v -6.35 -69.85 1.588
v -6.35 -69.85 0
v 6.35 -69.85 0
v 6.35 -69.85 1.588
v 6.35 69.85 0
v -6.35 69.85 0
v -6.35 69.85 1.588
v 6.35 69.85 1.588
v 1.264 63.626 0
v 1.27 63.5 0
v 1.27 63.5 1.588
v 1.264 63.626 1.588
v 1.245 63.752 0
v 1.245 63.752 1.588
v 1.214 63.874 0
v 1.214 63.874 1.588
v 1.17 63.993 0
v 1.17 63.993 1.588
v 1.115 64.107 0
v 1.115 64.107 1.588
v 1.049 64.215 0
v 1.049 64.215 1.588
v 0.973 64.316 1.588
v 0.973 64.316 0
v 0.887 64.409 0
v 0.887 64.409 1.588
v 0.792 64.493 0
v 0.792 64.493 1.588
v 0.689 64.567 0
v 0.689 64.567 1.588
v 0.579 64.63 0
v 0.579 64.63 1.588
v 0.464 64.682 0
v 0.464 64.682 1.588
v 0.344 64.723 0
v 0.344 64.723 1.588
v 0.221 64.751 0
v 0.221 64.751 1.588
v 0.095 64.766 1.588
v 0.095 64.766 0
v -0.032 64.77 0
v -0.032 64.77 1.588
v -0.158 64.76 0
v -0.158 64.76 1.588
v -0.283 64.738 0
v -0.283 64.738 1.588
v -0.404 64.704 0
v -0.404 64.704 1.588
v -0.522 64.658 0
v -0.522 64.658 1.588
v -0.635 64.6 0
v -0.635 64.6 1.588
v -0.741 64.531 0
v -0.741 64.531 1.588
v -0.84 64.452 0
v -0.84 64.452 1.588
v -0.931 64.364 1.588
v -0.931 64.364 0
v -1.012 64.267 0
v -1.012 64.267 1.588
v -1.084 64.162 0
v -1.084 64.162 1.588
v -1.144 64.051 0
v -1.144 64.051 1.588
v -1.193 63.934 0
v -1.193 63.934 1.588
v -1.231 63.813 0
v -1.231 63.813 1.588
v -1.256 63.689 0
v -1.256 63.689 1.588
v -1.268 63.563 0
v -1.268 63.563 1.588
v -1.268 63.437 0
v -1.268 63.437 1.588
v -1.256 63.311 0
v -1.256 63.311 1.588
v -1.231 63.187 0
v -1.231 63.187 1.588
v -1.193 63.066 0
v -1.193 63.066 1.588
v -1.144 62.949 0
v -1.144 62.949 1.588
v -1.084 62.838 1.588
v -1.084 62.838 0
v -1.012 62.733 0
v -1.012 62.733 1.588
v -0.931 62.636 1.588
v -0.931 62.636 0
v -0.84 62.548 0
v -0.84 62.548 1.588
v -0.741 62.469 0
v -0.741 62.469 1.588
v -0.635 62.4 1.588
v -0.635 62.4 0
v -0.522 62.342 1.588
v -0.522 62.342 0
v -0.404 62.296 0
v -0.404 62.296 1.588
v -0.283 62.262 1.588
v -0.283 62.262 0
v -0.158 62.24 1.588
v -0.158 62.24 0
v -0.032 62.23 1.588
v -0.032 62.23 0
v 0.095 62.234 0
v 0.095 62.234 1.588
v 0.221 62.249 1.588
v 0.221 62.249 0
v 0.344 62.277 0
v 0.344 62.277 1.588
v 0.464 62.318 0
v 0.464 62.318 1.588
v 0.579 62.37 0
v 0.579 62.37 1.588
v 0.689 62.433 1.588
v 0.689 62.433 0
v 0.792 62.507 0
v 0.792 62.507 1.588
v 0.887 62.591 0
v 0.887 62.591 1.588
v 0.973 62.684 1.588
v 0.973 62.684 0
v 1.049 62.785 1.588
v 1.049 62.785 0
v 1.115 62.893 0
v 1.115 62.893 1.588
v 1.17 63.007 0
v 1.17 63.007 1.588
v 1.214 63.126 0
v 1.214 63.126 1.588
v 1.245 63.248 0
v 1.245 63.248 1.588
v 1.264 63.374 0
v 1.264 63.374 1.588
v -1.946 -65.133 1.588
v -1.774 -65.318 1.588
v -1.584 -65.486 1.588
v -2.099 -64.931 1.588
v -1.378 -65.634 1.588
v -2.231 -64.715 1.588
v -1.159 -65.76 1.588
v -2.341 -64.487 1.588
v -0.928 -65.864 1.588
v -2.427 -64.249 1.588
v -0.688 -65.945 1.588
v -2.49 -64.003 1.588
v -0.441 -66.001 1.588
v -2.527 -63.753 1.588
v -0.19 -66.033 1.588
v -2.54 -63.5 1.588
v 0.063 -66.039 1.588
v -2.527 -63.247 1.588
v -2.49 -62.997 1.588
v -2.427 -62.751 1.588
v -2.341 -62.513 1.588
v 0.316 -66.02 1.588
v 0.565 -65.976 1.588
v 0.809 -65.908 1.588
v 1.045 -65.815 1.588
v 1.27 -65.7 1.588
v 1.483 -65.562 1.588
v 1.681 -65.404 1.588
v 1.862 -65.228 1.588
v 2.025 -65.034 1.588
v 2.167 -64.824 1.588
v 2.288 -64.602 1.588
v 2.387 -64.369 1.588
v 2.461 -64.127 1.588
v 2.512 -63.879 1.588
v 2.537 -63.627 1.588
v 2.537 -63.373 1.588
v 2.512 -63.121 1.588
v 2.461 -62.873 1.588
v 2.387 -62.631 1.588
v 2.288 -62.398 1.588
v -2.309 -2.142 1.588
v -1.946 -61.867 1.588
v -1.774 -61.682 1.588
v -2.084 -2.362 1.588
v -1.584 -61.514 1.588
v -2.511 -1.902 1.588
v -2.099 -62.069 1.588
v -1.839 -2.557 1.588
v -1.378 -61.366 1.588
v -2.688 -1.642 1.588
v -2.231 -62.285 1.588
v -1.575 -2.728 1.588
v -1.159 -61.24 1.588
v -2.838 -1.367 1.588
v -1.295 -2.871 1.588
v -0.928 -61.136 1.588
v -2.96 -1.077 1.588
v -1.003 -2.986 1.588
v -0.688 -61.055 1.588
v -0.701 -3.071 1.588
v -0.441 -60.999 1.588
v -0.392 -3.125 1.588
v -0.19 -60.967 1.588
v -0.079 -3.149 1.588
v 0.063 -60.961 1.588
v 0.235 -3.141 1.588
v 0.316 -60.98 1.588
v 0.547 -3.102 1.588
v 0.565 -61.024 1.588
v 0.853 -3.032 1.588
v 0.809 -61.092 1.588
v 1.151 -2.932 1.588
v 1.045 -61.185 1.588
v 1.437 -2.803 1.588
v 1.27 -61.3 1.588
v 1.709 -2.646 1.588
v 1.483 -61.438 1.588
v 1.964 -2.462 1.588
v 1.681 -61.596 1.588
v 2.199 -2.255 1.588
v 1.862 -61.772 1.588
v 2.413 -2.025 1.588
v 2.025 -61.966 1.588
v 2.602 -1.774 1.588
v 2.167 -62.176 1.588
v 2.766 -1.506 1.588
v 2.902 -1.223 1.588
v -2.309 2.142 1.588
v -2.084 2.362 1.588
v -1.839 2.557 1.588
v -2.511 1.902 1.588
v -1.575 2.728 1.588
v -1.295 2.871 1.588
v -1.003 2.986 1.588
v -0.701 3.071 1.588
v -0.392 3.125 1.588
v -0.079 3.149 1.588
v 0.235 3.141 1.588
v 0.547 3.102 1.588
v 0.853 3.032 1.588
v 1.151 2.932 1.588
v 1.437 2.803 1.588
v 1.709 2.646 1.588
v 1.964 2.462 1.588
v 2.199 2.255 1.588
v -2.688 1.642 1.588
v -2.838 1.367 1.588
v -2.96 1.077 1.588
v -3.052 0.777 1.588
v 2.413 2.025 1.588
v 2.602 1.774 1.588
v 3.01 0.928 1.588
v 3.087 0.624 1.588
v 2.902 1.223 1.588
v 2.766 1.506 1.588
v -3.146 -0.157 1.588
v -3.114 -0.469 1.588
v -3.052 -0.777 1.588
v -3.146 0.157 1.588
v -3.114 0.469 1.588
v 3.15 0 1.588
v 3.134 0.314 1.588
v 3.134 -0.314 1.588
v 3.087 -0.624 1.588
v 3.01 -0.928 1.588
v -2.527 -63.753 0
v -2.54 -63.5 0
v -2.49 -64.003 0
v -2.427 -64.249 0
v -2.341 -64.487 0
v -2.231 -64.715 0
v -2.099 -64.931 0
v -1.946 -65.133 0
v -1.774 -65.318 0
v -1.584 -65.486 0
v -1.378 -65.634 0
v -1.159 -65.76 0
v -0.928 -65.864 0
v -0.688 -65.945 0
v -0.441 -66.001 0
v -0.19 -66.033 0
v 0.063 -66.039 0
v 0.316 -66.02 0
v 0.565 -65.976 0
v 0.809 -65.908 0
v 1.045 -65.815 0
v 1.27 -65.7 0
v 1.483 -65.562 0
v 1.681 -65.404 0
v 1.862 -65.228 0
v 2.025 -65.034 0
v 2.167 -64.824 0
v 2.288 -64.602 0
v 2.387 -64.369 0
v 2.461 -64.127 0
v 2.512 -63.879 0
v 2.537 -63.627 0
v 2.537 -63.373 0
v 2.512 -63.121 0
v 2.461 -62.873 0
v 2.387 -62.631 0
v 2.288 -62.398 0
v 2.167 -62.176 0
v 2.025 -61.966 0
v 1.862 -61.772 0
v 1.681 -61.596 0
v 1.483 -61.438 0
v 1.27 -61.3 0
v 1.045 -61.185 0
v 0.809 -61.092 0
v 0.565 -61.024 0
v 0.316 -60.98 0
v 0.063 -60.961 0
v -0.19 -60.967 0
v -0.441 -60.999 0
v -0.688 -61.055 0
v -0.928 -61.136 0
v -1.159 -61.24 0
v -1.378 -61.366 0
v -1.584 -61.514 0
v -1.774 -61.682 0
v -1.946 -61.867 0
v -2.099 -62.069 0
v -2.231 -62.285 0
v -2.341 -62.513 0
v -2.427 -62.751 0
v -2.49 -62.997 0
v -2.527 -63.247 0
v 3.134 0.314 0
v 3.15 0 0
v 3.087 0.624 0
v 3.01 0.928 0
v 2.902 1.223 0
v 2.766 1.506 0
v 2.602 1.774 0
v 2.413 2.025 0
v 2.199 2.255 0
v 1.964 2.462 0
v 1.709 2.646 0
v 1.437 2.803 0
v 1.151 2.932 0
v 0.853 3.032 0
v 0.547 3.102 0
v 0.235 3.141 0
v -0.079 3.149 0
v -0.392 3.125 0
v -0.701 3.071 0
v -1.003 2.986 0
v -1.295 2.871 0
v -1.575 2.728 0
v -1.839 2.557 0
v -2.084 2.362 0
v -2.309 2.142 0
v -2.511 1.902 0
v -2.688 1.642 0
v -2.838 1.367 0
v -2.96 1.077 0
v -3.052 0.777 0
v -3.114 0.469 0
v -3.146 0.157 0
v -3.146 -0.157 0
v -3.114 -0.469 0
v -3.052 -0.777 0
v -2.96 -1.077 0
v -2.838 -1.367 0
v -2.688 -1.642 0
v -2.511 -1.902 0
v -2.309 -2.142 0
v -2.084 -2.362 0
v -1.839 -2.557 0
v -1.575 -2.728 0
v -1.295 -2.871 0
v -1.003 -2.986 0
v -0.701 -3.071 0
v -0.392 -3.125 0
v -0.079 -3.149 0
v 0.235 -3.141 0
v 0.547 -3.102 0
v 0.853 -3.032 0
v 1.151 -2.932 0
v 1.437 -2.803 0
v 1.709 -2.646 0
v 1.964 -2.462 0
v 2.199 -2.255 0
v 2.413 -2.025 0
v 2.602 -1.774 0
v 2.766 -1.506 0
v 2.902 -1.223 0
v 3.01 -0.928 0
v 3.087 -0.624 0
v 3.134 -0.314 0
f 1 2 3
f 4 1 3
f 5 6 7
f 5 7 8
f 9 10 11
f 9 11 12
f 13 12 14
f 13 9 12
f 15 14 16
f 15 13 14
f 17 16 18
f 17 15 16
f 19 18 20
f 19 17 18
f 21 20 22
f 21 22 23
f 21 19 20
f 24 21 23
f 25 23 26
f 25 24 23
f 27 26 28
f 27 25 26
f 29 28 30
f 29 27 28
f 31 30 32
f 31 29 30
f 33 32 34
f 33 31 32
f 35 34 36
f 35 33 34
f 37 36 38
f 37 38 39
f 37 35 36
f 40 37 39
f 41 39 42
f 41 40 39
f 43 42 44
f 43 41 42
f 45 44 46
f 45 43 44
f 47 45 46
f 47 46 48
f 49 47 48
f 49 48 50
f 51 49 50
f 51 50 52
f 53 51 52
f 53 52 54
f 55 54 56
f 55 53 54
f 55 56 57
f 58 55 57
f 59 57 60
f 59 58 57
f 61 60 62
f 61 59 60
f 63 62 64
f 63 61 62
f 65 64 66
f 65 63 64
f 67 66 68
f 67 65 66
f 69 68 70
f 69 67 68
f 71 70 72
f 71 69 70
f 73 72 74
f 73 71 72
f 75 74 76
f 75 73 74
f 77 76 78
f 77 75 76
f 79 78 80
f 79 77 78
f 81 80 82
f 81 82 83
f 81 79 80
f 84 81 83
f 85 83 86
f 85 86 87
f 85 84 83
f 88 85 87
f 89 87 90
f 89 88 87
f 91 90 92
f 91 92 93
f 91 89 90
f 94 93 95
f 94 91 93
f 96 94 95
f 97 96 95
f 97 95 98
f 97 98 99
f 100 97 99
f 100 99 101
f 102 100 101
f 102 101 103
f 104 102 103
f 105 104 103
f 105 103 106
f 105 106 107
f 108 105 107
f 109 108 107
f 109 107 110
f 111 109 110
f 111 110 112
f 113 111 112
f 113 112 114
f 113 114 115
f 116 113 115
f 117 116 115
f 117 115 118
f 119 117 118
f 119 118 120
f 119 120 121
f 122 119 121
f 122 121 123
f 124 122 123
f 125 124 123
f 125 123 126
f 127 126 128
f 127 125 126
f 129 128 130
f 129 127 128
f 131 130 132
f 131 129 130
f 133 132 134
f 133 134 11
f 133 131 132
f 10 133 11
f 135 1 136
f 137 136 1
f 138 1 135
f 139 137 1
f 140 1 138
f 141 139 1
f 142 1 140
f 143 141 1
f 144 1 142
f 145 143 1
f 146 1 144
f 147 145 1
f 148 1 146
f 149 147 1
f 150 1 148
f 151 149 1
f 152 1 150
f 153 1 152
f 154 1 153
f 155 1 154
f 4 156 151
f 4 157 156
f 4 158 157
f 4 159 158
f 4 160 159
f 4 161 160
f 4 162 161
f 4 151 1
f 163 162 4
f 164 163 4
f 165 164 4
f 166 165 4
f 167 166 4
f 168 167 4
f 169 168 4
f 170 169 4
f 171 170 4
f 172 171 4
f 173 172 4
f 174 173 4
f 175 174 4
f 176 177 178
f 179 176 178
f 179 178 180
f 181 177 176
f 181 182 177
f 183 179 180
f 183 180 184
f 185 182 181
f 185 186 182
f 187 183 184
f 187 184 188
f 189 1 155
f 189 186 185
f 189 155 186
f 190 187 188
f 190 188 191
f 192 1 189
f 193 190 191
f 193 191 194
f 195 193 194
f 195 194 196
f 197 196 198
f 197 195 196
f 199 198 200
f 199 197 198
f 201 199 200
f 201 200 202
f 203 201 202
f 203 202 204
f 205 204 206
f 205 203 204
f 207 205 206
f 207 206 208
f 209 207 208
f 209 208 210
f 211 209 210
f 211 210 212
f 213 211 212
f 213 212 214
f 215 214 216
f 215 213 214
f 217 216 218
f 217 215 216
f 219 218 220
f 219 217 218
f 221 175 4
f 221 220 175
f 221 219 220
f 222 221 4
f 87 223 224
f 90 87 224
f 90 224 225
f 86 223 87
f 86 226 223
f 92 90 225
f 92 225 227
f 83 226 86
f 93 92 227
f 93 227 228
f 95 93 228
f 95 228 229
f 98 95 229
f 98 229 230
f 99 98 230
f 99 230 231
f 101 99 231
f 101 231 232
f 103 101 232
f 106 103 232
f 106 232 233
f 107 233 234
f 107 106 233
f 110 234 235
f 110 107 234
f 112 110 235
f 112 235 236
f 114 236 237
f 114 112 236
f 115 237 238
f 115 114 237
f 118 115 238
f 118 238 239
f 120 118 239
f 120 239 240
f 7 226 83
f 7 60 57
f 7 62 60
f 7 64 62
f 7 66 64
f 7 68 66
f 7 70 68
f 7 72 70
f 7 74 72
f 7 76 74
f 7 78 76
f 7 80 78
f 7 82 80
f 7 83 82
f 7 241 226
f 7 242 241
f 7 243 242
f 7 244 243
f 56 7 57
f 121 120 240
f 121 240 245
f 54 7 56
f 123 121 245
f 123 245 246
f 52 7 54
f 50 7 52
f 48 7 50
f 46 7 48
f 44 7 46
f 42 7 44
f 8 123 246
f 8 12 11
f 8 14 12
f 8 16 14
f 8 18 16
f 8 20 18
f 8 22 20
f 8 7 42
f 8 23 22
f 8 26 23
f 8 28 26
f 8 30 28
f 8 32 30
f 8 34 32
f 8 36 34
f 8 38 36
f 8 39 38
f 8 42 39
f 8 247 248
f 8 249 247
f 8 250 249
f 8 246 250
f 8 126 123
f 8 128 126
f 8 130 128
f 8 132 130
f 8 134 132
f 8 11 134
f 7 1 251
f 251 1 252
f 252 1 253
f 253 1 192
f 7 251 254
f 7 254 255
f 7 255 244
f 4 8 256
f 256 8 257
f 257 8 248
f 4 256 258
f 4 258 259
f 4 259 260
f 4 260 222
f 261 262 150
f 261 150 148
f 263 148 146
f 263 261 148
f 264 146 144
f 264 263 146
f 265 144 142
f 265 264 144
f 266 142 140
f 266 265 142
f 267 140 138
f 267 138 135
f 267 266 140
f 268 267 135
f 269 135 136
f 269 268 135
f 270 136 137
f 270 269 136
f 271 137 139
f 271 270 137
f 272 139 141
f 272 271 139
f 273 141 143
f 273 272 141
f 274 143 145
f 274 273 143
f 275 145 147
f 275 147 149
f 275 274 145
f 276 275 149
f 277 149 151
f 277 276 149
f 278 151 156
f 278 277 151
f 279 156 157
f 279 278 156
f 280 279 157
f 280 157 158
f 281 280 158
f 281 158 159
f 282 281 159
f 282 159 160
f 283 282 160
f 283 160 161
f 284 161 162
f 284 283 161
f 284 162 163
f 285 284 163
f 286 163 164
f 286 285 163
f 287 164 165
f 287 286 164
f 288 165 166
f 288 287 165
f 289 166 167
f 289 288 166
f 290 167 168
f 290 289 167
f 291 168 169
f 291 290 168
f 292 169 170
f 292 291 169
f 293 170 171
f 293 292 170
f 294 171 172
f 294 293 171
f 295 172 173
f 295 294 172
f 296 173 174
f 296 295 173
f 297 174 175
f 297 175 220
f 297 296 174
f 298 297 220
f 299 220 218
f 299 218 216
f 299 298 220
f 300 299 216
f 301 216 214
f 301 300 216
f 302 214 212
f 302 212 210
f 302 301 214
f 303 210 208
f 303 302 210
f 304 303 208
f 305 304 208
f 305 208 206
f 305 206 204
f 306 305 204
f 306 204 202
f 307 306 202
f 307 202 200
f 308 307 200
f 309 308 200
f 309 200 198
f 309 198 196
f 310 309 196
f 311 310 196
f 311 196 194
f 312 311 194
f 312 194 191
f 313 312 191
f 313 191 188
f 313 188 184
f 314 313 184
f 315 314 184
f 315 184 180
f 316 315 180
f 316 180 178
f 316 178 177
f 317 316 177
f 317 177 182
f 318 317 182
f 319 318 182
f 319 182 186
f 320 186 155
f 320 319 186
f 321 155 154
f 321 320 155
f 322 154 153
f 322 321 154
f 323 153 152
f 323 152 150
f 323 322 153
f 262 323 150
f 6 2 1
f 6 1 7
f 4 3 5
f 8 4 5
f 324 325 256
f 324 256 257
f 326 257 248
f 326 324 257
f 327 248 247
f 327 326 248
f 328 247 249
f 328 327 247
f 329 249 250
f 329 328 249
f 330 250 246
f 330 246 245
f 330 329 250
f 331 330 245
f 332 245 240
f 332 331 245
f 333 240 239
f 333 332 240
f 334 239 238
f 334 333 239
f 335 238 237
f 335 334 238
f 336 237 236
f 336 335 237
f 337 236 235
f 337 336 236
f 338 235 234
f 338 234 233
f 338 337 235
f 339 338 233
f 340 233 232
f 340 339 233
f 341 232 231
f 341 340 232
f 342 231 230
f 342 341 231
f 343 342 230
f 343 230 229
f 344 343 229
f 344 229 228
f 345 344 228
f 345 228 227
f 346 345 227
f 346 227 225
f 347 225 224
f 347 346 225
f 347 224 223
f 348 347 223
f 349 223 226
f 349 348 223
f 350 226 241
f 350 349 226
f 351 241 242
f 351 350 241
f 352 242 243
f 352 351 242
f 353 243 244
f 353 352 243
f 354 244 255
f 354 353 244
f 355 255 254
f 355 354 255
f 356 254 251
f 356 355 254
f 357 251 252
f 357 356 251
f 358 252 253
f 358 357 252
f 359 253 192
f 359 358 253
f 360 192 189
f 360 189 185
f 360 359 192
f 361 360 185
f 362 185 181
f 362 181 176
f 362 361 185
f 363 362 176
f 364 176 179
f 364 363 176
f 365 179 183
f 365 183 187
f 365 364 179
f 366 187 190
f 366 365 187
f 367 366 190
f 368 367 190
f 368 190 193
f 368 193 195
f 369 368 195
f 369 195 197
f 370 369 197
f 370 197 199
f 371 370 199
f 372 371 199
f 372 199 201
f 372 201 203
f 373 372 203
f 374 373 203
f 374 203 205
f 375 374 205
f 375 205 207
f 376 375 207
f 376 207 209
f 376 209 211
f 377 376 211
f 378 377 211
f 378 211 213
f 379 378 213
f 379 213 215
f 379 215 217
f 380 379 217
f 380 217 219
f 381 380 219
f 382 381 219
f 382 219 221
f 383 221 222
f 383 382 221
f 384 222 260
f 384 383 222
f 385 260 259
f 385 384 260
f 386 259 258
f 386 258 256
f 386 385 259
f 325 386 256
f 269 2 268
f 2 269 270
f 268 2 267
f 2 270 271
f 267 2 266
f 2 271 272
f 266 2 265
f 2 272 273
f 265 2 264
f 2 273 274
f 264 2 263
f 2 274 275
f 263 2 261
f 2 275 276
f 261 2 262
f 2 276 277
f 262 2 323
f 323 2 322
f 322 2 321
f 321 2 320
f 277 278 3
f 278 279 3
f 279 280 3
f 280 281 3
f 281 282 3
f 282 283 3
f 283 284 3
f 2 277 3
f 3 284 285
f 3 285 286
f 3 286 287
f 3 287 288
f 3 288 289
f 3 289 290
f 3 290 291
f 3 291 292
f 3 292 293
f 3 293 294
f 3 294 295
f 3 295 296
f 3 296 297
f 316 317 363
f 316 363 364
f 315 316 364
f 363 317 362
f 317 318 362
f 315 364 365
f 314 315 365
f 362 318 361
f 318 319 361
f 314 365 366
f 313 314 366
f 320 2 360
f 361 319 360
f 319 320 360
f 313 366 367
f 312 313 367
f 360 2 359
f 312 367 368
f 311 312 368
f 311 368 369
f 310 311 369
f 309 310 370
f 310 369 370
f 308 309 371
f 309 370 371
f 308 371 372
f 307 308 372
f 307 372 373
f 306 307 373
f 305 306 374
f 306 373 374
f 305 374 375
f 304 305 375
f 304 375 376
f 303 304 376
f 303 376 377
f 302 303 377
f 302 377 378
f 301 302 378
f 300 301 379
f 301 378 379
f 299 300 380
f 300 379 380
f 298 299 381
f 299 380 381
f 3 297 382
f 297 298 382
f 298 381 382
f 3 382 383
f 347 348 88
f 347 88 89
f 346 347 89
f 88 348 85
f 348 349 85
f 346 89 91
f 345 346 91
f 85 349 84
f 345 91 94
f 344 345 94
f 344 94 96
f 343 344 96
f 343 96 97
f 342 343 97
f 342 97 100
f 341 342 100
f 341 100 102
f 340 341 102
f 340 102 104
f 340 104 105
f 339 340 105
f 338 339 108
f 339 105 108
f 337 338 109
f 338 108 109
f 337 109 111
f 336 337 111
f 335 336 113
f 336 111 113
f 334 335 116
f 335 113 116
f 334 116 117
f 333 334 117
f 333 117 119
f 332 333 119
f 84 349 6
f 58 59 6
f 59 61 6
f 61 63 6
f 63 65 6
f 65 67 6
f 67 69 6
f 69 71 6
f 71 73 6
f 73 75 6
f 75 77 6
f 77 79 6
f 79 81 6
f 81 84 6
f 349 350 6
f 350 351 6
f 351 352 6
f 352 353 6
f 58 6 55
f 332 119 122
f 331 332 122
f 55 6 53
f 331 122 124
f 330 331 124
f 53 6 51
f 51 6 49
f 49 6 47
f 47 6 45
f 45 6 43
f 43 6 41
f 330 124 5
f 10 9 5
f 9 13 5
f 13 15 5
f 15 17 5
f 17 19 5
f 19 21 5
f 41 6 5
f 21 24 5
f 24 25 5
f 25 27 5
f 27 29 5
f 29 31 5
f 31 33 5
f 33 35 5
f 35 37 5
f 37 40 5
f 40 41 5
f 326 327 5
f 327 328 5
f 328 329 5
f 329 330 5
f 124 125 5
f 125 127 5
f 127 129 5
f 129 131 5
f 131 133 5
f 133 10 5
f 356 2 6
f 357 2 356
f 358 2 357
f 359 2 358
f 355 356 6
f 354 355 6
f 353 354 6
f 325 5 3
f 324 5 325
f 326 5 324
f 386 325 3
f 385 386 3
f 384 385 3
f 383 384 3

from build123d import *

# Parameters (mm, degrees)
SKETCH1_W           = 12.7
SKETCH1_H           = 139.7
SKETCH1_R           = 3.1496
SKETCH1_R_2         = 1.27
SKETCH1_R_3         = 2.54
BOSS_EXTRUDE1_DEPTH = 1.5875


with BuildPart() as part:
    # Sketch1 → Boss-Extrude1 (new body)
    with BuildSketch(Plane.XY):
        Rectangle(SKETCH1_W, SKETCH1_H)
        Circle(SKETCH1_R, mode=Mode.SUBTRACT)
        with Locations((0, 63.5)):
            Circle(SKETCH1_R_2, mode=Mode.SUBTRACT)
        with Locations(Location((0, -63.5, 0), (0, 0, 180))):
            Circle(SKETCH1_R_3, mode=Mode.SUBTRACT)
    extrude(amount=BOSS_EXTRUDE1_DEPTH)


solid = part.part
